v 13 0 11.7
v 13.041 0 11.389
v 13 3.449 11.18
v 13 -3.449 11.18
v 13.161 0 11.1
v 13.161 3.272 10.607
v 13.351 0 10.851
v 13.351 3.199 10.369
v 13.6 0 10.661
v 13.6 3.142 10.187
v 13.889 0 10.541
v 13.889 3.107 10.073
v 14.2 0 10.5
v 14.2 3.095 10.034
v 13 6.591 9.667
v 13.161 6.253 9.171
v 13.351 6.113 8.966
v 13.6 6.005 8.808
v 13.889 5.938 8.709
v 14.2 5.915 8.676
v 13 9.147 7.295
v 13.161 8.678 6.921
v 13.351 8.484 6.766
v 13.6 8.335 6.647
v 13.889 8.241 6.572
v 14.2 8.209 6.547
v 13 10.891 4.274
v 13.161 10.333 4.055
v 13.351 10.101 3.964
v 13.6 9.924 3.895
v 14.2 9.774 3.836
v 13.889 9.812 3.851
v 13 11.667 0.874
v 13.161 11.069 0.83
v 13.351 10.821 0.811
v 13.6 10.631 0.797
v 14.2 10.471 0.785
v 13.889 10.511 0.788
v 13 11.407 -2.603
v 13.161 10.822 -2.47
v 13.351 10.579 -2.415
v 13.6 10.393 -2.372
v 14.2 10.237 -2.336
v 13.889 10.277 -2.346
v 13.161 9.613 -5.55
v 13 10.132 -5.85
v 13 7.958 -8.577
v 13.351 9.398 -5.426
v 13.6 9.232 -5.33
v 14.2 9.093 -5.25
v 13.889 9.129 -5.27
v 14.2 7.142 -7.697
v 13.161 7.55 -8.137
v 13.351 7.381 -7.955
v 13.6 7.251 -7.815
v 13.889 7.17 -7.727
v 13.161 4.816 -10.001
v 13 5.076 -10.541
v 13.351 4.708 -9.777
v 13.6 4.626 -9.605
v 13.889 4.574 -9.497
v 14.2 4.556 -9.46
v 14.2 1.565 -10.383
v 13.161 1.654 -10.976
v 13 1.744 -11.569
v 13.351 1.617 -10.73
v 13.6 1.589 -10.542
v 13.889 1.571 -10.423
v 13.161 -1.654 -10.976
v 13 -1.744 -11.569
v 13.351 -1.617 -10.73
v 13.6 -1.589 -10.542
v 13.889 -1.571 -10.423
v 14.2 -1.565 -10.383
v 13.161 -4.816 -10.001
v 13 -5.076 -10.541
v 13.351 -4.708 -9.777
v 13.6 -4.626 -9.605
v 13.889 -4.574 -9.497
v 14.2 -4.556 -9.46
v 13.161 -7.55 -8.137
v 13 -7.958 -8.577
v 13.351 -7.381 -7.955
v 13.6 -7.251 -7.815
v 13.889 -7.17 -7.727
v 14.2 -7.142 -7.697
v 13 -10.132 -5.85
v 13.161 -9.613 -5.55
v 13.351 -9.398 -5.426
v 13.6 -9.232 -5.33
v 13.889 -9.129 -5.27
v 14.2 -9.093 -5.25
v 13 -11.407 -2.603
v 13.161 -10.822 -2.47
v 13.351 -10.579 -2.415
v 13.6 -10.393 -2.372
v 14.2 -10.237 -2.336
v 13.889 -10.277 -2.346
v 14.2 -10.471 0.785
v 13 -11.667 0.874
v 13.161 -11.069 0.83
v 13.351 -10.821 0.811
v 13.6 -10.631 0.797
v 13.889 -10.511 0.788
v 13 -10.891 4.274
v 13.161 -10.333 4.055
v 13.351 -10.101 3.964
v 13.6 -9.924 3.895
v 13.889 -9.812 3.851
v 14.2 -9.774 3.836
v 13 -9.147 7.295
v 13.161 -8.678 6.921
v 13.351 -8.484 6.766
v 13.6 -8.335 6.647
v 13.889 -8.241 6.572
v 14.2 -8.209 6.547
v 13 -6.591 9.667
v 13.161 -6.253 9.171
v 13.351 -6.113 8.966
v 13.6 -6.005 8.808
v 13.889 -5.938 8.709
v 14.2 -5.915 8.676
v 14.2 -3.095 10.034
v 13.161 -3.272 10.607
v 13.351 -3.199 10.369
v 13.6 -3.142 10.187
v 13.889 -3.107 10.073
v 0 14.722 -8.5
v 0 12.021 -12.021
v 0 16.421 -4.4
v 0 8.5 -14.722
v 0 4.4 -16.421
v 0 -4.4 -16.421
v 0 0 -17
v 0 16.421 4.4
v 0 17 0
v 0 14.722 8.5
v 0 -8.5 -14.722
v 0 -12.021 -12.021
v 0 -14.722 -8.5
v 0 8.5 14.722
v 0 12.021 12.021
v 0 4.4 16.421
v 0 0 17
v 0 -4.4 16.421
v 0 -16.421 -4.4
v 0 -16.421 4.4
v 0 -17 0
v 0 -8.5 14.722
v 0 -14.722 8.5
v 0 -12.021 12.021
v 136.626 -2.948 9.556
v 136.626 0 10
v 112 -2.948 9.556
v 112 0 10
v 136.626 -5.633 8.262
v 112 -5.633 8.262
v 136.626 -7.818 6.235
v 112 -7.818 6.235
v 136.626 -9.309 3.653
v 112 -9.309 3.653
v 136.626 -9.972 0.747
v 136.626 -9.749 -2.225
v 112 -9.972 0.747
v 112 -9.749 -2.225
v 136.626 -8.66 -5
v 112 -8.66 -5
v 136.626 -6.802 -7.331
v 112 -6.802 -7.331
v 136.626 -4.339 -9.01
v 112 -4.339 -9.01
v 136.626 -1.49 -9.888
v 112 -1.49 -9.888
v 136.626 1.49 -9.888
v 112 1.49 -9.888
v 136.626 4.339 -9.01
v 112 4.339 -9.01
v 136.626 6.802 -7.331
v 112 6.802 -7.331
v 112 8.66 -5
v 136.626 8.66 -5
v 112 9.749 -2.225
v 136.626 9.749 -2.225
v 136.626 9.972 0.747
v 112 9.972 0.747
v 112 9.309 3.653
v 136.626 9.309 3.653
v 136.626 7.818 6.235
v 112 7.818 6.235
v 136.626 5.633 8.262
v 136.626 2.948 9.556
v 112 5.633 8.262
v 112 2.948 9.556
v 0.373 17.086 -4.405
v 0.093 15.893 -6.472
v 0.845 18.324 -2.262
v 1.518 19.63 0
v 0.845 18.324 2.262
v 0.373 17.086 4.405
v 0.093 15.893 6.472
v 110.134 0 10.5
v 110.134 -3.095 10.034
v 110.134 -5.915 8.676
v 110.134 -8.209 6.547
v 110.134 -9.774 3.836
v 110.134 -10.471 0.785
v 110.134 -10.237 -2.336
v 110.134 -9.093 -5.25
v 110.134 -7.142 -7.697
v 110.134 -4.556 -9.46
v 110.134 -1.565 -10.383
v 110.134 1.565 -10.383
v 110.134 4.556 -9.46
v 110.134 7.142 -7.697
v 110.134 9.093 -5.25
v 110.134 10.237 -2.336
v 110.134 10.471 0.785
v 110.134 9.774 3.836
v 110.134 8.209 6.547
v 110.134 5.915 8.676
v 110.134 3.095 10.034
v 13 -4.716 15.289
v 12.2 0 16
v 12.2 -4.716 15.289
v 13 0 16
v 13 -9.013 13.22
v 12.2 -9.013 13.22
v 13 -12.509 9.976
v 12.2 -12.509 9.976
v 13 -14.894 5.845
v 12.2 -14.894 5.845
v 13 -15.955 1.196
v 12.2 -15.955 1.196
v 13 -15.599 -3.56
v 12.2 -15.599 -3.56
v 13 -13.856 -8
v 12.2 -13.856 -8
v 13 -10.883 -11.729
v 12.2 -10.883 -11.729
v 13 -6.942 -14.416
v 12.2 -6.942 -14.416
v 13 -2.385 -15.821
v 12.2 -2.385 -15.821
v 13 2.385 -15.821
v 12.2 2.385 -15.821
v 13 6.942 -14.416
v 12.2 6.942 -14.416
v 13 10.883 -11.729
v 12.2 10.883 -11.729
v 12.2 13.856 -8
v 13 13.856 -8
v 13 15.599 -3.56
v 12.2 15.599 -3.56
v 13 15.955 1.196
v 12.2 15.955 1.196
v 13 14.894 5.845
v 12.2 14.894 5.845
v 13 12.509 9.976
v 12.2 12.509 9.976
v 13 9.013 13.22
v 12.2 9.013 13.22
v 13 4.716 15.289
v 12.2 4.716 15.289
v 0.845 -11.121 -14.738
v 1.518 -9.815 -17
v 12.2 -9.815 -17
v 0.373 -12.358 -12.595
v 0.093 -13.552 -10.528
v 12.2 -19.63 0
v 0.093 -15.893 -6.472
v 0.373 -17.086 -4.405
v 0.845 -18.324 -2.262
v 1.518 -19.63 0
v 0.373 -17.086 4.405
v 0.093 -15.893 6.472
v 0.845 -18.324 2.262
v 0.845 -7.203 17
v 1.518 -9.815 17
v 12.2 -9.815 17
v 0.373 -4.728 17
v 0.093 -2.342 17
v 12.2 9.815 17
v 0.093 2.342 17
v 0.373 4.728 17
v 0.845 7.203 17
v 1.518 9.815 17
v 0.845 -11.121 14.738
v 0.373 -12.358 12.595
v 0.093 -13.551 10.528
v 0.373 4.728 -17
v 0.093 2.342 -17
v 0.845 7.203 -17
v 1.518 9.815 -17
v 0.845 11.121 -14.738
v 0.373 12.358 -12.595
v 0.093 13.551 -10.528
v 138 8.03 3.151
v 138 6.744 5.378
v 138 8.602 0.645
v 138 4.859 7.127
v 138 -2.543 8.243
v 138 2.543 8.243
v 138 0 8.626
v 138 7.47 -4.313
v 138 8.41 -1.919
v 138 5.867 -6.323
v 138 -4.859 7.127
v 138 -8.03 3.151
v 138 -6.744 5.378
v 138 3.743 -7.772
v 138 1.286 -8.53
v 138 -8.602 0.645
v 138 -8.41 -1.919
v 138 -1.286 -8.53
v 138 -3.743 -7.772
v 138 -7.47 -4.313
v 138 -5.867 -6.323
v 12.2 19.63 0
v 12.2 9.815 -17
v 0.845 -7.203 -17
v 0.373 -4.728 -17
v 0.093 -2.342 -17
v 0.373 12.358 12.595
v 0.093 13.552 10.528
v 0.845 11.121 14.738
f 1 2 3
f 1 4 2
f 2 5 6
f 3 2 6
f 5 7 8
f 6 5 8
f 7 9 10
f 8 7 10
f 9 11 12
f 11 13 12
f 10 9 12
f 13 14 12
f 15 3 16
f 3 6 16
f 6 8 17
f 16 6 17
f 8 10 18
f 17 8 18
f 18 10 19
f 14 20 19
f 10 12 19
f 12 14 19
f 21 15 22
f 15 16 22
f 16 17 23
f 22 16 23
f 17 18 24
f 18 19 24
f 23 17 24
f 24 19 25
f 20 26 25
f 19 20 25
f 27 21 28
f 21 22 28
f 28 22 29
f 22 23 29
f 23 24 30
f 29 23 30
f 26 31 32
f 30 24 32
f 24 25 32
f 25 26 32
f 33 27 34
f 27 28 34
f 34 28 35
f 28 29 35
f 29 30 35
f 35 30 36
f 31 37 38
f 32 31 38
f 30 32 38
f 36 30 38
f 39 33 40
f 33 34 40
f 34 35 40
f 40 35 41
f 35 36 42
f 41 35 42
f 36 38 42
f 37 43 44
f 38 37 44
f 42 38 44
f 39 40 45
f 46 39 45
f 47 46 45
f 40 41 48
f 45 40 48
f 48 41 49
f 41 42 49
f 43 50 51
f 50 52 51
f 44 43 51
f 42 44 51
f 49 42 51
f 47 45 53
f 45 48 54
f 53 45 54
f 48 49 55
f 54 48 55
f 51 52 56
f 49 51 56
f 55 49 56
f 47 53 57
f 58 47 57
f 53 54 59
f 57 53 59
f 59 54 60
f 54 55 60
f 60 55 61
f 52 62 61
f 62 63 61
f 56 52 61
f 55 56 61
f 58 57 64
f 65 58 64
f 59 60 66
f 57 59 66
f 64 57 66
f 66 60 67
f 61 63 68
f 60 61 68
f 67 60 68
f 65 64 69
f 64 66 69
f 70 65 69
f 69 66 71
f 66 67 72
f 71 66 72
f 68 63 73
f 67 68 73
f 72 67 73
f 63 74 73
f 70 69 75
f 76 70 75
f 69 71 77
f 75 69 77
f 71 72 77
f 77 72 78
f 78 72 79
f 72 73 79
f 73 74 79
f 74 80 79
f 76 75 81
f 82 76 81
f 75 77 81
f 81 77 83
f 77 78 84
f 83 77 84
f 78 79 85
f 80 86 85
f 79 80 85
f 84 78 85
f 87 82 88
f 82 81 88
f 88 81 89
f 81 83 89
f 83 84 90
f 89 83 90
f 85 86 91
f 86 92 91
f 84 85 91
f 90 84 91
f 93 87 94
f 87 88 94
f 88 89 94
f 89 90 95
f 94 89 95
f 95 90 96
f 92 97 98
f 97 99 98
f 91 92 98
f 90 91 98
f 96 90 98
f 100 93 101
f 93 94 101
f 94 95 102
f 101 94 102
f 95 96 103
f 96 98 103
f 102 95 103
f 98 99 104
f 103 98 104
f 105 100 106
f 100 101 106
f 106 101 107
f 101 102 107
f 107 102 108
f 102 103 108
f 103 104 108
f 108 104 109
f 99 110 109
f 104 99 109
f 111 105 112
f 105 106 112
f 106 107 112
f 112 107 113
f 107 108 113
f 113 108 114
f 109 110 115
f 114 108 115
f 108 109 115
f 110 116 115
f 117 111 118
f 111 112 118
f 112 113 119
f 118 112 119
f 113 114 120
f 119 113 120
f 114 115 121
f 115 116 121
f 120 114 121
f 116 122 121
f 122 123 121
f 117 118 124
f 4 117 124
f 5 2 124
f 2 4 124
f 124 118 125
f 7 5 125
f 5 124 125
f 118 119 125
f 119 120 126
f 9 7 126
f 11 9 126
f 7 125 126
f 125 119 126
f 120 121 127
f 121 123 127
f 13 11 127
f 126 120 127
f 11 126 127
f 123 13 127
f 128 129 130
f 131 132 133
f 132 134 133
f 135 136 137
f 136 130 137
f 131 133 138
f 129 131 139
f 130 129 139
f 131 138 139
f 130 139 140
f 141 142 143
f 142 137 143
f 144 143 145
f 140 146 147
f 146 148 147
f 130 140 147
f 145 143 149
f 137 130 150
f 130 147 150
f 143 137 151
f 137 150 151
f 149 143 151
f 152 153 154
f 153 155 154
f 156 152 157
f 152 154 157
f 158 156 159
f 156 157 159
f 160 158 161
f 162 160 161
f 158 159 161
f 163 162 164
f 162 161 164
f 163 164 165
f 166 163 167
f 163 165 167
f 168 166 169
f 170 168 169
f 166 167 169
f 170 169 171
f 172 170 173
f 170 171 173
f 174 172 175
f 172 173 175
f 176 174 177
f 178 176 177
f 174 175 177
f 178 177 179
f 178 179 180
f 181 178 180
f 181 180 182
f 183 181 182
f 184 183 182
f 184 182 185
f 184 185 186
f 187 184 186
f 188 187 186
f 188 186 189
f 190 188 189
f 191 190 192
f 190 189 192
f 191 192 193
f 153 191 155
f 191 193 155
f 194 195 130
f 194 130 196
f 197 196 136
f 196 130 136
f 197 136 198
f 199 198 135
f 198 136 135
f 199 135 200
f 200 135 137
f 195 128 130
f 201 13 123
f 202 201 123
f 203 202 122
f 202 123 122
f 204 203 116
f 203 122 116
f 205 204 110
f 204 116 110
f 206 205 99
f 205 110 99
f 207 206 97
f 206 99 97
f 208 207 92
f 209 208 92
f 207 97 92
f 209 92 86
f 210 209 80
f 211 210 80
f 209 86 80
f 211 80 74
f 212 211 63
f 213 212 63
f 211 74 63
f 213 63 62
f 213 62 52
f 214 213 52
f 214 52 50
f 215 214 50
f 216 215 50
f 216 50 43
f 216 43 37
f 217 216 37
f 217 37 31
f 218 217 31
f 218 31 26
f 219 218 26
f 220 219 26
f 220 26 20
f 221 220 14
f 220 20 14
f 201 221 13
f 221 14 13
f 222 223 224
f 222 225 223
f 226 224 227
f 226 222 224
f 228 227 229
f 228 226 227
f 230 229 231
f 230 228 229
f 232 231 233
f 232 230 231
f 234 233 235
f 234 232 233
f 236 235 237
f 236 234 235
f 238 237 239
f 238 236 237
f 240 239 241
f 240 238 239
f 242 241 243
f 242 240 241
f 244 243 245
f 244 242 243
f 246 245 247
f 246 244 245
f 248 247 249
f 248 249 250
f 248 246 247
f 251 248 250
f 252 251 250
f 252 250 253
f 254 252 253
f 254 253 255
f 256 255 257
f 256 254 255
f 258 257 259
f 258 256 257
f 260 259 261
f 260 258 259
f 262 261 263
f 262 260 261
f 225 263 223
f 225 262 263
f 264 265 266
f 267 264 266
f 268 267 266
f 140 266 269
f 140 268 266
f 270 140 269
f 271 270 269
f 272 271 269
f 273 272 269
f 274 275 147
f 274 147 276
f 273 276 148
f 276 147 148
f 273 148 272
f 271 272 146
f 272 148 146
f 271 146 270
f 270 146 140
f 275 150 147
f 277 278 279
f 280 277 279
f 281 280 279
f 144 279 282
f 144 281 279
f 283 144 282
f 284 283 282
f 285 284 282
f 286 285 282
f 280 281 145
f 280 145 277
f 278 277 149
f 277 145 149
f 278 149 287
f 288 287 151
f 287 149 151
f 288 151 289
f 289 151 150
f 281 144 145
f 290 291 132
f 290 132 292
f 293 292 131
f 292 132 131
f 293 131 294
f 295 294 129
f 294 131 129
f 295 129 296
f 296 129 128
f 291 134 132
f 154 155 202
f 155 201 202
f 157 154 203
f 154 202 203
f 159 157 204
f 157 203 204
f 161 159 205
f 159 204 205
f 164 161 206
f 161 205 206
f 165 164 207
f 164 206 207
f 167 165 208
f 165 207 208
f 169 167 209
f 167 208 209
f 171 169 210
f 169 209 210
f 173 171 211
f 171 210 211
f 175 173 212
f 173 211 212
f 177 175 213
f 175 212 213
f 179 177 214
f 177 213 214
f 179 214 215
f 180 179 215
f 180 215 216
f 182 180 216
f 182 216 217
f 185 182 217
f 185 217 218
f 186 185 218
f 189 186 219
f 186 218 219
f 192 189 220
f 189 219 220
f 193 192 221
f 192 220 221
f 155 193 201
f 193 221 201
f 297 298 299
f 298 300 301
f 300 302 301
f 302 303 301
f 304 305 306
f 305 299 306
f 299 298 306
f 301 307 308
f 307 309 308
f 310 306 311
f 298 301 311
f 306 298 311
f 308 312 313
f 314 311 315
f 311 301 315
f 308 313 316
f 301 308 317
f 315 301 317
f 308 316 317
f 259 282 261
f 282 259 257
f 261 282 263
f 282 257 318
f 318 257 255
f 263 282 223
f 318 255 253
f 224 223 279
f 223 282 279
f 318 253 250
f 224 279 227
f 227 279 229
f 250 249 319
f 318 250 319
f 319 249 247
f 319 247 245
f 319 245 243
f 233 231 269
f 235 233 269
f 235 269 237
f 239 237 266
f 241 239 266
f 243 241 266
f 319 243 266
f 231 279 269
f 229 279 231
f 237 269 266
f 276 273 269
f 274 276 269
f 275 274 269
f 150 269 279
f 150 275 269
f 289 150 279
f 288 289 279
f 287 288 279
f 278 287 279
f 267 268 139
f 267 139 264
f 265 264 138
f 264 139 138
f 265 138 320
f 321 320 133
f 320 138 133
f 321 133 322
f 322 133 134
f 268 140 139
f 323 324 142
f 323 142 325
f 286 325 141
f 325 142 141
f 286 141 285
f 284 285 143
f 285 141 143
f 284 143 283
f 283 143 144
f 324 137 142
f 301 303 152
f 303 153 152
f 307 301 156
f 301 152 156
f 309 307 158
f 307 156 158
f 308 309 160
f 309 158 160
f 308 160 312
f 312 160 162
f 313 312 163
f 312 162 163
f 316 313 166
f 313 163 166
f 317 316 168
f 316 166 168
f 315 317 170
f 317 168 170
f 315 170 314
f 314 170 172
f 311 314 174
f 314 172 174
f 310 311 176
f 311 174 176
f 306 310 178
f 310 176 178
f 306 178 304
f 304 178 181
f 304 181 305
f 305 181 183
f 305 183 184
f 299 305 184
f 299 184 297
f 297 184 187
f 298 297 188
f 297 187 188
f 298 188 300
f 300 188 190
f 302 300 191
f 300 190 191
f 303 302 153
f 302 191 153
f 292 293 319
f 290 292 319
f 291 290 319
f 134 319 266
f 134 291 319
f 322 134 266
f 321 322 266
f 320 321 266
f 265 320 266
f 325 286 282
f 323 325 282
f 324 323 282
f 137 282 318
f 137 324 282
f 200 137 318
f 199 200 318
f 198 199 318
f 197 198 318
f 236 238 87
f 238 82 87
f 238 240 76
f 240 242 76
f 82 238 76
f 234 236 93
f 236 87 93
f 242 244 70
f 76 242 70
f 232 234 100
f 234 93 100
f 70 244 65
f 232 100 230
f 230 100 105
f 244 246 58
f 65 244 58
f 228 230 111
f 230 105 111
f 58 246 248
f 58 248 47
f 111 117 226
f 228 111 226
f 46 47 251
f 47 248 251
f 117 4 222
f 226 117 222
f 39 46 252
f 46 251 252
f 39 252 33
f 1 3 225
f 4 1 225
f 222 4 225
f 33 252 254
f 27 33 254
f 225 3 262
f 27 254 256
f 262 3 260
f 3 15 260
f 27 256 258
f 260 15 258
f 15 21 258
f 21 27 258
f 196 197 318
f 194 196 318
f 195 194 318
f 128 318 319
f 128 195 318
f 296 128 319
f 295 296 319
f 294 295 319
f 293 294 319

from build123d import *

# Parameters (mm, degrees)
BASEHEAD_DEPTH = 13
SKETCH4_W      = 0.8
SKETCH4_H      = 3.629909152
HEADFILLET_R   = 1.2


with BuildPart() as part:
    # HeadSke → BaseHead (new body)
    with BuildSketch(Plane(origin=(0, 0, 0), x_dir=(0, 0, -1), z_dir=(1, 0, 0))):
        Polygon((17, 9.814954576), (17, -9.814954576), (0, -19.629909152), (-17, -9.814954576), (-17, 9.814954576), (0, 19.629909152), align=None)
    extrude(amount=BASEHEAD_DEPTH)

    # BodySke → BaseBody (revolve)
    with BuildSketch(Plane.XY, mode=Mode.PRIVATE) as basebody_sk:
        Polygon((0, 10.5), (0, 0), (138, 0), (138, 8.626), (136.626, 10), (112, 10), (110.133974596, 10.5), align=None)
    revolve(basebody_sk.sketch.rotate(Axis((0, 0, 0), (1, 0, 0)), 90), axis=Axis((0, 0, 0), (1, 0, 0)))

    # Sketch3 → HeadChamfer (revolve, cut)
    with BuildSketch(Plane(origin=(0, 0, 0), x_dir=(1, 0, 0), z_dir=(0, 1, 0))):
        Polygon((4.25, 24.361215932), (-4.25, 9.638784068), (-11.424013371, 13.780702619), (-2.924013371, 28.503134483), align=None)
    revolve(axis=Axis((0, 0, 0), (1, 0, 0)), mode=Mode.SUBTRACT)

    # Sketch4 → BearingFace (revolve, cut)
    with BuildSketch(Plane.XY, mode=Mode.PRIVATE) as bearingface_sk:
        with Locations((12.6, 17.814954576)):
            Rectangle(SKETCH4_W, SKETCH4_H)
    revolve(bearingface_sk.sketch.rotate(Axis((0, 0, 0), (1, 0, 0)), 90), axis=Axis((0, 0, 0), (1, 0, 0)), mode=Mode.SUBTRACT)

    # HeadFillet
    headfillet_edges = [part.edges().sort_by_distance(p)[0] for p in [
        (13, 0, -10.5),
    ]]
    fillet(headfillet_edges, radius=HEADFILLET_R)


solid = part.part
